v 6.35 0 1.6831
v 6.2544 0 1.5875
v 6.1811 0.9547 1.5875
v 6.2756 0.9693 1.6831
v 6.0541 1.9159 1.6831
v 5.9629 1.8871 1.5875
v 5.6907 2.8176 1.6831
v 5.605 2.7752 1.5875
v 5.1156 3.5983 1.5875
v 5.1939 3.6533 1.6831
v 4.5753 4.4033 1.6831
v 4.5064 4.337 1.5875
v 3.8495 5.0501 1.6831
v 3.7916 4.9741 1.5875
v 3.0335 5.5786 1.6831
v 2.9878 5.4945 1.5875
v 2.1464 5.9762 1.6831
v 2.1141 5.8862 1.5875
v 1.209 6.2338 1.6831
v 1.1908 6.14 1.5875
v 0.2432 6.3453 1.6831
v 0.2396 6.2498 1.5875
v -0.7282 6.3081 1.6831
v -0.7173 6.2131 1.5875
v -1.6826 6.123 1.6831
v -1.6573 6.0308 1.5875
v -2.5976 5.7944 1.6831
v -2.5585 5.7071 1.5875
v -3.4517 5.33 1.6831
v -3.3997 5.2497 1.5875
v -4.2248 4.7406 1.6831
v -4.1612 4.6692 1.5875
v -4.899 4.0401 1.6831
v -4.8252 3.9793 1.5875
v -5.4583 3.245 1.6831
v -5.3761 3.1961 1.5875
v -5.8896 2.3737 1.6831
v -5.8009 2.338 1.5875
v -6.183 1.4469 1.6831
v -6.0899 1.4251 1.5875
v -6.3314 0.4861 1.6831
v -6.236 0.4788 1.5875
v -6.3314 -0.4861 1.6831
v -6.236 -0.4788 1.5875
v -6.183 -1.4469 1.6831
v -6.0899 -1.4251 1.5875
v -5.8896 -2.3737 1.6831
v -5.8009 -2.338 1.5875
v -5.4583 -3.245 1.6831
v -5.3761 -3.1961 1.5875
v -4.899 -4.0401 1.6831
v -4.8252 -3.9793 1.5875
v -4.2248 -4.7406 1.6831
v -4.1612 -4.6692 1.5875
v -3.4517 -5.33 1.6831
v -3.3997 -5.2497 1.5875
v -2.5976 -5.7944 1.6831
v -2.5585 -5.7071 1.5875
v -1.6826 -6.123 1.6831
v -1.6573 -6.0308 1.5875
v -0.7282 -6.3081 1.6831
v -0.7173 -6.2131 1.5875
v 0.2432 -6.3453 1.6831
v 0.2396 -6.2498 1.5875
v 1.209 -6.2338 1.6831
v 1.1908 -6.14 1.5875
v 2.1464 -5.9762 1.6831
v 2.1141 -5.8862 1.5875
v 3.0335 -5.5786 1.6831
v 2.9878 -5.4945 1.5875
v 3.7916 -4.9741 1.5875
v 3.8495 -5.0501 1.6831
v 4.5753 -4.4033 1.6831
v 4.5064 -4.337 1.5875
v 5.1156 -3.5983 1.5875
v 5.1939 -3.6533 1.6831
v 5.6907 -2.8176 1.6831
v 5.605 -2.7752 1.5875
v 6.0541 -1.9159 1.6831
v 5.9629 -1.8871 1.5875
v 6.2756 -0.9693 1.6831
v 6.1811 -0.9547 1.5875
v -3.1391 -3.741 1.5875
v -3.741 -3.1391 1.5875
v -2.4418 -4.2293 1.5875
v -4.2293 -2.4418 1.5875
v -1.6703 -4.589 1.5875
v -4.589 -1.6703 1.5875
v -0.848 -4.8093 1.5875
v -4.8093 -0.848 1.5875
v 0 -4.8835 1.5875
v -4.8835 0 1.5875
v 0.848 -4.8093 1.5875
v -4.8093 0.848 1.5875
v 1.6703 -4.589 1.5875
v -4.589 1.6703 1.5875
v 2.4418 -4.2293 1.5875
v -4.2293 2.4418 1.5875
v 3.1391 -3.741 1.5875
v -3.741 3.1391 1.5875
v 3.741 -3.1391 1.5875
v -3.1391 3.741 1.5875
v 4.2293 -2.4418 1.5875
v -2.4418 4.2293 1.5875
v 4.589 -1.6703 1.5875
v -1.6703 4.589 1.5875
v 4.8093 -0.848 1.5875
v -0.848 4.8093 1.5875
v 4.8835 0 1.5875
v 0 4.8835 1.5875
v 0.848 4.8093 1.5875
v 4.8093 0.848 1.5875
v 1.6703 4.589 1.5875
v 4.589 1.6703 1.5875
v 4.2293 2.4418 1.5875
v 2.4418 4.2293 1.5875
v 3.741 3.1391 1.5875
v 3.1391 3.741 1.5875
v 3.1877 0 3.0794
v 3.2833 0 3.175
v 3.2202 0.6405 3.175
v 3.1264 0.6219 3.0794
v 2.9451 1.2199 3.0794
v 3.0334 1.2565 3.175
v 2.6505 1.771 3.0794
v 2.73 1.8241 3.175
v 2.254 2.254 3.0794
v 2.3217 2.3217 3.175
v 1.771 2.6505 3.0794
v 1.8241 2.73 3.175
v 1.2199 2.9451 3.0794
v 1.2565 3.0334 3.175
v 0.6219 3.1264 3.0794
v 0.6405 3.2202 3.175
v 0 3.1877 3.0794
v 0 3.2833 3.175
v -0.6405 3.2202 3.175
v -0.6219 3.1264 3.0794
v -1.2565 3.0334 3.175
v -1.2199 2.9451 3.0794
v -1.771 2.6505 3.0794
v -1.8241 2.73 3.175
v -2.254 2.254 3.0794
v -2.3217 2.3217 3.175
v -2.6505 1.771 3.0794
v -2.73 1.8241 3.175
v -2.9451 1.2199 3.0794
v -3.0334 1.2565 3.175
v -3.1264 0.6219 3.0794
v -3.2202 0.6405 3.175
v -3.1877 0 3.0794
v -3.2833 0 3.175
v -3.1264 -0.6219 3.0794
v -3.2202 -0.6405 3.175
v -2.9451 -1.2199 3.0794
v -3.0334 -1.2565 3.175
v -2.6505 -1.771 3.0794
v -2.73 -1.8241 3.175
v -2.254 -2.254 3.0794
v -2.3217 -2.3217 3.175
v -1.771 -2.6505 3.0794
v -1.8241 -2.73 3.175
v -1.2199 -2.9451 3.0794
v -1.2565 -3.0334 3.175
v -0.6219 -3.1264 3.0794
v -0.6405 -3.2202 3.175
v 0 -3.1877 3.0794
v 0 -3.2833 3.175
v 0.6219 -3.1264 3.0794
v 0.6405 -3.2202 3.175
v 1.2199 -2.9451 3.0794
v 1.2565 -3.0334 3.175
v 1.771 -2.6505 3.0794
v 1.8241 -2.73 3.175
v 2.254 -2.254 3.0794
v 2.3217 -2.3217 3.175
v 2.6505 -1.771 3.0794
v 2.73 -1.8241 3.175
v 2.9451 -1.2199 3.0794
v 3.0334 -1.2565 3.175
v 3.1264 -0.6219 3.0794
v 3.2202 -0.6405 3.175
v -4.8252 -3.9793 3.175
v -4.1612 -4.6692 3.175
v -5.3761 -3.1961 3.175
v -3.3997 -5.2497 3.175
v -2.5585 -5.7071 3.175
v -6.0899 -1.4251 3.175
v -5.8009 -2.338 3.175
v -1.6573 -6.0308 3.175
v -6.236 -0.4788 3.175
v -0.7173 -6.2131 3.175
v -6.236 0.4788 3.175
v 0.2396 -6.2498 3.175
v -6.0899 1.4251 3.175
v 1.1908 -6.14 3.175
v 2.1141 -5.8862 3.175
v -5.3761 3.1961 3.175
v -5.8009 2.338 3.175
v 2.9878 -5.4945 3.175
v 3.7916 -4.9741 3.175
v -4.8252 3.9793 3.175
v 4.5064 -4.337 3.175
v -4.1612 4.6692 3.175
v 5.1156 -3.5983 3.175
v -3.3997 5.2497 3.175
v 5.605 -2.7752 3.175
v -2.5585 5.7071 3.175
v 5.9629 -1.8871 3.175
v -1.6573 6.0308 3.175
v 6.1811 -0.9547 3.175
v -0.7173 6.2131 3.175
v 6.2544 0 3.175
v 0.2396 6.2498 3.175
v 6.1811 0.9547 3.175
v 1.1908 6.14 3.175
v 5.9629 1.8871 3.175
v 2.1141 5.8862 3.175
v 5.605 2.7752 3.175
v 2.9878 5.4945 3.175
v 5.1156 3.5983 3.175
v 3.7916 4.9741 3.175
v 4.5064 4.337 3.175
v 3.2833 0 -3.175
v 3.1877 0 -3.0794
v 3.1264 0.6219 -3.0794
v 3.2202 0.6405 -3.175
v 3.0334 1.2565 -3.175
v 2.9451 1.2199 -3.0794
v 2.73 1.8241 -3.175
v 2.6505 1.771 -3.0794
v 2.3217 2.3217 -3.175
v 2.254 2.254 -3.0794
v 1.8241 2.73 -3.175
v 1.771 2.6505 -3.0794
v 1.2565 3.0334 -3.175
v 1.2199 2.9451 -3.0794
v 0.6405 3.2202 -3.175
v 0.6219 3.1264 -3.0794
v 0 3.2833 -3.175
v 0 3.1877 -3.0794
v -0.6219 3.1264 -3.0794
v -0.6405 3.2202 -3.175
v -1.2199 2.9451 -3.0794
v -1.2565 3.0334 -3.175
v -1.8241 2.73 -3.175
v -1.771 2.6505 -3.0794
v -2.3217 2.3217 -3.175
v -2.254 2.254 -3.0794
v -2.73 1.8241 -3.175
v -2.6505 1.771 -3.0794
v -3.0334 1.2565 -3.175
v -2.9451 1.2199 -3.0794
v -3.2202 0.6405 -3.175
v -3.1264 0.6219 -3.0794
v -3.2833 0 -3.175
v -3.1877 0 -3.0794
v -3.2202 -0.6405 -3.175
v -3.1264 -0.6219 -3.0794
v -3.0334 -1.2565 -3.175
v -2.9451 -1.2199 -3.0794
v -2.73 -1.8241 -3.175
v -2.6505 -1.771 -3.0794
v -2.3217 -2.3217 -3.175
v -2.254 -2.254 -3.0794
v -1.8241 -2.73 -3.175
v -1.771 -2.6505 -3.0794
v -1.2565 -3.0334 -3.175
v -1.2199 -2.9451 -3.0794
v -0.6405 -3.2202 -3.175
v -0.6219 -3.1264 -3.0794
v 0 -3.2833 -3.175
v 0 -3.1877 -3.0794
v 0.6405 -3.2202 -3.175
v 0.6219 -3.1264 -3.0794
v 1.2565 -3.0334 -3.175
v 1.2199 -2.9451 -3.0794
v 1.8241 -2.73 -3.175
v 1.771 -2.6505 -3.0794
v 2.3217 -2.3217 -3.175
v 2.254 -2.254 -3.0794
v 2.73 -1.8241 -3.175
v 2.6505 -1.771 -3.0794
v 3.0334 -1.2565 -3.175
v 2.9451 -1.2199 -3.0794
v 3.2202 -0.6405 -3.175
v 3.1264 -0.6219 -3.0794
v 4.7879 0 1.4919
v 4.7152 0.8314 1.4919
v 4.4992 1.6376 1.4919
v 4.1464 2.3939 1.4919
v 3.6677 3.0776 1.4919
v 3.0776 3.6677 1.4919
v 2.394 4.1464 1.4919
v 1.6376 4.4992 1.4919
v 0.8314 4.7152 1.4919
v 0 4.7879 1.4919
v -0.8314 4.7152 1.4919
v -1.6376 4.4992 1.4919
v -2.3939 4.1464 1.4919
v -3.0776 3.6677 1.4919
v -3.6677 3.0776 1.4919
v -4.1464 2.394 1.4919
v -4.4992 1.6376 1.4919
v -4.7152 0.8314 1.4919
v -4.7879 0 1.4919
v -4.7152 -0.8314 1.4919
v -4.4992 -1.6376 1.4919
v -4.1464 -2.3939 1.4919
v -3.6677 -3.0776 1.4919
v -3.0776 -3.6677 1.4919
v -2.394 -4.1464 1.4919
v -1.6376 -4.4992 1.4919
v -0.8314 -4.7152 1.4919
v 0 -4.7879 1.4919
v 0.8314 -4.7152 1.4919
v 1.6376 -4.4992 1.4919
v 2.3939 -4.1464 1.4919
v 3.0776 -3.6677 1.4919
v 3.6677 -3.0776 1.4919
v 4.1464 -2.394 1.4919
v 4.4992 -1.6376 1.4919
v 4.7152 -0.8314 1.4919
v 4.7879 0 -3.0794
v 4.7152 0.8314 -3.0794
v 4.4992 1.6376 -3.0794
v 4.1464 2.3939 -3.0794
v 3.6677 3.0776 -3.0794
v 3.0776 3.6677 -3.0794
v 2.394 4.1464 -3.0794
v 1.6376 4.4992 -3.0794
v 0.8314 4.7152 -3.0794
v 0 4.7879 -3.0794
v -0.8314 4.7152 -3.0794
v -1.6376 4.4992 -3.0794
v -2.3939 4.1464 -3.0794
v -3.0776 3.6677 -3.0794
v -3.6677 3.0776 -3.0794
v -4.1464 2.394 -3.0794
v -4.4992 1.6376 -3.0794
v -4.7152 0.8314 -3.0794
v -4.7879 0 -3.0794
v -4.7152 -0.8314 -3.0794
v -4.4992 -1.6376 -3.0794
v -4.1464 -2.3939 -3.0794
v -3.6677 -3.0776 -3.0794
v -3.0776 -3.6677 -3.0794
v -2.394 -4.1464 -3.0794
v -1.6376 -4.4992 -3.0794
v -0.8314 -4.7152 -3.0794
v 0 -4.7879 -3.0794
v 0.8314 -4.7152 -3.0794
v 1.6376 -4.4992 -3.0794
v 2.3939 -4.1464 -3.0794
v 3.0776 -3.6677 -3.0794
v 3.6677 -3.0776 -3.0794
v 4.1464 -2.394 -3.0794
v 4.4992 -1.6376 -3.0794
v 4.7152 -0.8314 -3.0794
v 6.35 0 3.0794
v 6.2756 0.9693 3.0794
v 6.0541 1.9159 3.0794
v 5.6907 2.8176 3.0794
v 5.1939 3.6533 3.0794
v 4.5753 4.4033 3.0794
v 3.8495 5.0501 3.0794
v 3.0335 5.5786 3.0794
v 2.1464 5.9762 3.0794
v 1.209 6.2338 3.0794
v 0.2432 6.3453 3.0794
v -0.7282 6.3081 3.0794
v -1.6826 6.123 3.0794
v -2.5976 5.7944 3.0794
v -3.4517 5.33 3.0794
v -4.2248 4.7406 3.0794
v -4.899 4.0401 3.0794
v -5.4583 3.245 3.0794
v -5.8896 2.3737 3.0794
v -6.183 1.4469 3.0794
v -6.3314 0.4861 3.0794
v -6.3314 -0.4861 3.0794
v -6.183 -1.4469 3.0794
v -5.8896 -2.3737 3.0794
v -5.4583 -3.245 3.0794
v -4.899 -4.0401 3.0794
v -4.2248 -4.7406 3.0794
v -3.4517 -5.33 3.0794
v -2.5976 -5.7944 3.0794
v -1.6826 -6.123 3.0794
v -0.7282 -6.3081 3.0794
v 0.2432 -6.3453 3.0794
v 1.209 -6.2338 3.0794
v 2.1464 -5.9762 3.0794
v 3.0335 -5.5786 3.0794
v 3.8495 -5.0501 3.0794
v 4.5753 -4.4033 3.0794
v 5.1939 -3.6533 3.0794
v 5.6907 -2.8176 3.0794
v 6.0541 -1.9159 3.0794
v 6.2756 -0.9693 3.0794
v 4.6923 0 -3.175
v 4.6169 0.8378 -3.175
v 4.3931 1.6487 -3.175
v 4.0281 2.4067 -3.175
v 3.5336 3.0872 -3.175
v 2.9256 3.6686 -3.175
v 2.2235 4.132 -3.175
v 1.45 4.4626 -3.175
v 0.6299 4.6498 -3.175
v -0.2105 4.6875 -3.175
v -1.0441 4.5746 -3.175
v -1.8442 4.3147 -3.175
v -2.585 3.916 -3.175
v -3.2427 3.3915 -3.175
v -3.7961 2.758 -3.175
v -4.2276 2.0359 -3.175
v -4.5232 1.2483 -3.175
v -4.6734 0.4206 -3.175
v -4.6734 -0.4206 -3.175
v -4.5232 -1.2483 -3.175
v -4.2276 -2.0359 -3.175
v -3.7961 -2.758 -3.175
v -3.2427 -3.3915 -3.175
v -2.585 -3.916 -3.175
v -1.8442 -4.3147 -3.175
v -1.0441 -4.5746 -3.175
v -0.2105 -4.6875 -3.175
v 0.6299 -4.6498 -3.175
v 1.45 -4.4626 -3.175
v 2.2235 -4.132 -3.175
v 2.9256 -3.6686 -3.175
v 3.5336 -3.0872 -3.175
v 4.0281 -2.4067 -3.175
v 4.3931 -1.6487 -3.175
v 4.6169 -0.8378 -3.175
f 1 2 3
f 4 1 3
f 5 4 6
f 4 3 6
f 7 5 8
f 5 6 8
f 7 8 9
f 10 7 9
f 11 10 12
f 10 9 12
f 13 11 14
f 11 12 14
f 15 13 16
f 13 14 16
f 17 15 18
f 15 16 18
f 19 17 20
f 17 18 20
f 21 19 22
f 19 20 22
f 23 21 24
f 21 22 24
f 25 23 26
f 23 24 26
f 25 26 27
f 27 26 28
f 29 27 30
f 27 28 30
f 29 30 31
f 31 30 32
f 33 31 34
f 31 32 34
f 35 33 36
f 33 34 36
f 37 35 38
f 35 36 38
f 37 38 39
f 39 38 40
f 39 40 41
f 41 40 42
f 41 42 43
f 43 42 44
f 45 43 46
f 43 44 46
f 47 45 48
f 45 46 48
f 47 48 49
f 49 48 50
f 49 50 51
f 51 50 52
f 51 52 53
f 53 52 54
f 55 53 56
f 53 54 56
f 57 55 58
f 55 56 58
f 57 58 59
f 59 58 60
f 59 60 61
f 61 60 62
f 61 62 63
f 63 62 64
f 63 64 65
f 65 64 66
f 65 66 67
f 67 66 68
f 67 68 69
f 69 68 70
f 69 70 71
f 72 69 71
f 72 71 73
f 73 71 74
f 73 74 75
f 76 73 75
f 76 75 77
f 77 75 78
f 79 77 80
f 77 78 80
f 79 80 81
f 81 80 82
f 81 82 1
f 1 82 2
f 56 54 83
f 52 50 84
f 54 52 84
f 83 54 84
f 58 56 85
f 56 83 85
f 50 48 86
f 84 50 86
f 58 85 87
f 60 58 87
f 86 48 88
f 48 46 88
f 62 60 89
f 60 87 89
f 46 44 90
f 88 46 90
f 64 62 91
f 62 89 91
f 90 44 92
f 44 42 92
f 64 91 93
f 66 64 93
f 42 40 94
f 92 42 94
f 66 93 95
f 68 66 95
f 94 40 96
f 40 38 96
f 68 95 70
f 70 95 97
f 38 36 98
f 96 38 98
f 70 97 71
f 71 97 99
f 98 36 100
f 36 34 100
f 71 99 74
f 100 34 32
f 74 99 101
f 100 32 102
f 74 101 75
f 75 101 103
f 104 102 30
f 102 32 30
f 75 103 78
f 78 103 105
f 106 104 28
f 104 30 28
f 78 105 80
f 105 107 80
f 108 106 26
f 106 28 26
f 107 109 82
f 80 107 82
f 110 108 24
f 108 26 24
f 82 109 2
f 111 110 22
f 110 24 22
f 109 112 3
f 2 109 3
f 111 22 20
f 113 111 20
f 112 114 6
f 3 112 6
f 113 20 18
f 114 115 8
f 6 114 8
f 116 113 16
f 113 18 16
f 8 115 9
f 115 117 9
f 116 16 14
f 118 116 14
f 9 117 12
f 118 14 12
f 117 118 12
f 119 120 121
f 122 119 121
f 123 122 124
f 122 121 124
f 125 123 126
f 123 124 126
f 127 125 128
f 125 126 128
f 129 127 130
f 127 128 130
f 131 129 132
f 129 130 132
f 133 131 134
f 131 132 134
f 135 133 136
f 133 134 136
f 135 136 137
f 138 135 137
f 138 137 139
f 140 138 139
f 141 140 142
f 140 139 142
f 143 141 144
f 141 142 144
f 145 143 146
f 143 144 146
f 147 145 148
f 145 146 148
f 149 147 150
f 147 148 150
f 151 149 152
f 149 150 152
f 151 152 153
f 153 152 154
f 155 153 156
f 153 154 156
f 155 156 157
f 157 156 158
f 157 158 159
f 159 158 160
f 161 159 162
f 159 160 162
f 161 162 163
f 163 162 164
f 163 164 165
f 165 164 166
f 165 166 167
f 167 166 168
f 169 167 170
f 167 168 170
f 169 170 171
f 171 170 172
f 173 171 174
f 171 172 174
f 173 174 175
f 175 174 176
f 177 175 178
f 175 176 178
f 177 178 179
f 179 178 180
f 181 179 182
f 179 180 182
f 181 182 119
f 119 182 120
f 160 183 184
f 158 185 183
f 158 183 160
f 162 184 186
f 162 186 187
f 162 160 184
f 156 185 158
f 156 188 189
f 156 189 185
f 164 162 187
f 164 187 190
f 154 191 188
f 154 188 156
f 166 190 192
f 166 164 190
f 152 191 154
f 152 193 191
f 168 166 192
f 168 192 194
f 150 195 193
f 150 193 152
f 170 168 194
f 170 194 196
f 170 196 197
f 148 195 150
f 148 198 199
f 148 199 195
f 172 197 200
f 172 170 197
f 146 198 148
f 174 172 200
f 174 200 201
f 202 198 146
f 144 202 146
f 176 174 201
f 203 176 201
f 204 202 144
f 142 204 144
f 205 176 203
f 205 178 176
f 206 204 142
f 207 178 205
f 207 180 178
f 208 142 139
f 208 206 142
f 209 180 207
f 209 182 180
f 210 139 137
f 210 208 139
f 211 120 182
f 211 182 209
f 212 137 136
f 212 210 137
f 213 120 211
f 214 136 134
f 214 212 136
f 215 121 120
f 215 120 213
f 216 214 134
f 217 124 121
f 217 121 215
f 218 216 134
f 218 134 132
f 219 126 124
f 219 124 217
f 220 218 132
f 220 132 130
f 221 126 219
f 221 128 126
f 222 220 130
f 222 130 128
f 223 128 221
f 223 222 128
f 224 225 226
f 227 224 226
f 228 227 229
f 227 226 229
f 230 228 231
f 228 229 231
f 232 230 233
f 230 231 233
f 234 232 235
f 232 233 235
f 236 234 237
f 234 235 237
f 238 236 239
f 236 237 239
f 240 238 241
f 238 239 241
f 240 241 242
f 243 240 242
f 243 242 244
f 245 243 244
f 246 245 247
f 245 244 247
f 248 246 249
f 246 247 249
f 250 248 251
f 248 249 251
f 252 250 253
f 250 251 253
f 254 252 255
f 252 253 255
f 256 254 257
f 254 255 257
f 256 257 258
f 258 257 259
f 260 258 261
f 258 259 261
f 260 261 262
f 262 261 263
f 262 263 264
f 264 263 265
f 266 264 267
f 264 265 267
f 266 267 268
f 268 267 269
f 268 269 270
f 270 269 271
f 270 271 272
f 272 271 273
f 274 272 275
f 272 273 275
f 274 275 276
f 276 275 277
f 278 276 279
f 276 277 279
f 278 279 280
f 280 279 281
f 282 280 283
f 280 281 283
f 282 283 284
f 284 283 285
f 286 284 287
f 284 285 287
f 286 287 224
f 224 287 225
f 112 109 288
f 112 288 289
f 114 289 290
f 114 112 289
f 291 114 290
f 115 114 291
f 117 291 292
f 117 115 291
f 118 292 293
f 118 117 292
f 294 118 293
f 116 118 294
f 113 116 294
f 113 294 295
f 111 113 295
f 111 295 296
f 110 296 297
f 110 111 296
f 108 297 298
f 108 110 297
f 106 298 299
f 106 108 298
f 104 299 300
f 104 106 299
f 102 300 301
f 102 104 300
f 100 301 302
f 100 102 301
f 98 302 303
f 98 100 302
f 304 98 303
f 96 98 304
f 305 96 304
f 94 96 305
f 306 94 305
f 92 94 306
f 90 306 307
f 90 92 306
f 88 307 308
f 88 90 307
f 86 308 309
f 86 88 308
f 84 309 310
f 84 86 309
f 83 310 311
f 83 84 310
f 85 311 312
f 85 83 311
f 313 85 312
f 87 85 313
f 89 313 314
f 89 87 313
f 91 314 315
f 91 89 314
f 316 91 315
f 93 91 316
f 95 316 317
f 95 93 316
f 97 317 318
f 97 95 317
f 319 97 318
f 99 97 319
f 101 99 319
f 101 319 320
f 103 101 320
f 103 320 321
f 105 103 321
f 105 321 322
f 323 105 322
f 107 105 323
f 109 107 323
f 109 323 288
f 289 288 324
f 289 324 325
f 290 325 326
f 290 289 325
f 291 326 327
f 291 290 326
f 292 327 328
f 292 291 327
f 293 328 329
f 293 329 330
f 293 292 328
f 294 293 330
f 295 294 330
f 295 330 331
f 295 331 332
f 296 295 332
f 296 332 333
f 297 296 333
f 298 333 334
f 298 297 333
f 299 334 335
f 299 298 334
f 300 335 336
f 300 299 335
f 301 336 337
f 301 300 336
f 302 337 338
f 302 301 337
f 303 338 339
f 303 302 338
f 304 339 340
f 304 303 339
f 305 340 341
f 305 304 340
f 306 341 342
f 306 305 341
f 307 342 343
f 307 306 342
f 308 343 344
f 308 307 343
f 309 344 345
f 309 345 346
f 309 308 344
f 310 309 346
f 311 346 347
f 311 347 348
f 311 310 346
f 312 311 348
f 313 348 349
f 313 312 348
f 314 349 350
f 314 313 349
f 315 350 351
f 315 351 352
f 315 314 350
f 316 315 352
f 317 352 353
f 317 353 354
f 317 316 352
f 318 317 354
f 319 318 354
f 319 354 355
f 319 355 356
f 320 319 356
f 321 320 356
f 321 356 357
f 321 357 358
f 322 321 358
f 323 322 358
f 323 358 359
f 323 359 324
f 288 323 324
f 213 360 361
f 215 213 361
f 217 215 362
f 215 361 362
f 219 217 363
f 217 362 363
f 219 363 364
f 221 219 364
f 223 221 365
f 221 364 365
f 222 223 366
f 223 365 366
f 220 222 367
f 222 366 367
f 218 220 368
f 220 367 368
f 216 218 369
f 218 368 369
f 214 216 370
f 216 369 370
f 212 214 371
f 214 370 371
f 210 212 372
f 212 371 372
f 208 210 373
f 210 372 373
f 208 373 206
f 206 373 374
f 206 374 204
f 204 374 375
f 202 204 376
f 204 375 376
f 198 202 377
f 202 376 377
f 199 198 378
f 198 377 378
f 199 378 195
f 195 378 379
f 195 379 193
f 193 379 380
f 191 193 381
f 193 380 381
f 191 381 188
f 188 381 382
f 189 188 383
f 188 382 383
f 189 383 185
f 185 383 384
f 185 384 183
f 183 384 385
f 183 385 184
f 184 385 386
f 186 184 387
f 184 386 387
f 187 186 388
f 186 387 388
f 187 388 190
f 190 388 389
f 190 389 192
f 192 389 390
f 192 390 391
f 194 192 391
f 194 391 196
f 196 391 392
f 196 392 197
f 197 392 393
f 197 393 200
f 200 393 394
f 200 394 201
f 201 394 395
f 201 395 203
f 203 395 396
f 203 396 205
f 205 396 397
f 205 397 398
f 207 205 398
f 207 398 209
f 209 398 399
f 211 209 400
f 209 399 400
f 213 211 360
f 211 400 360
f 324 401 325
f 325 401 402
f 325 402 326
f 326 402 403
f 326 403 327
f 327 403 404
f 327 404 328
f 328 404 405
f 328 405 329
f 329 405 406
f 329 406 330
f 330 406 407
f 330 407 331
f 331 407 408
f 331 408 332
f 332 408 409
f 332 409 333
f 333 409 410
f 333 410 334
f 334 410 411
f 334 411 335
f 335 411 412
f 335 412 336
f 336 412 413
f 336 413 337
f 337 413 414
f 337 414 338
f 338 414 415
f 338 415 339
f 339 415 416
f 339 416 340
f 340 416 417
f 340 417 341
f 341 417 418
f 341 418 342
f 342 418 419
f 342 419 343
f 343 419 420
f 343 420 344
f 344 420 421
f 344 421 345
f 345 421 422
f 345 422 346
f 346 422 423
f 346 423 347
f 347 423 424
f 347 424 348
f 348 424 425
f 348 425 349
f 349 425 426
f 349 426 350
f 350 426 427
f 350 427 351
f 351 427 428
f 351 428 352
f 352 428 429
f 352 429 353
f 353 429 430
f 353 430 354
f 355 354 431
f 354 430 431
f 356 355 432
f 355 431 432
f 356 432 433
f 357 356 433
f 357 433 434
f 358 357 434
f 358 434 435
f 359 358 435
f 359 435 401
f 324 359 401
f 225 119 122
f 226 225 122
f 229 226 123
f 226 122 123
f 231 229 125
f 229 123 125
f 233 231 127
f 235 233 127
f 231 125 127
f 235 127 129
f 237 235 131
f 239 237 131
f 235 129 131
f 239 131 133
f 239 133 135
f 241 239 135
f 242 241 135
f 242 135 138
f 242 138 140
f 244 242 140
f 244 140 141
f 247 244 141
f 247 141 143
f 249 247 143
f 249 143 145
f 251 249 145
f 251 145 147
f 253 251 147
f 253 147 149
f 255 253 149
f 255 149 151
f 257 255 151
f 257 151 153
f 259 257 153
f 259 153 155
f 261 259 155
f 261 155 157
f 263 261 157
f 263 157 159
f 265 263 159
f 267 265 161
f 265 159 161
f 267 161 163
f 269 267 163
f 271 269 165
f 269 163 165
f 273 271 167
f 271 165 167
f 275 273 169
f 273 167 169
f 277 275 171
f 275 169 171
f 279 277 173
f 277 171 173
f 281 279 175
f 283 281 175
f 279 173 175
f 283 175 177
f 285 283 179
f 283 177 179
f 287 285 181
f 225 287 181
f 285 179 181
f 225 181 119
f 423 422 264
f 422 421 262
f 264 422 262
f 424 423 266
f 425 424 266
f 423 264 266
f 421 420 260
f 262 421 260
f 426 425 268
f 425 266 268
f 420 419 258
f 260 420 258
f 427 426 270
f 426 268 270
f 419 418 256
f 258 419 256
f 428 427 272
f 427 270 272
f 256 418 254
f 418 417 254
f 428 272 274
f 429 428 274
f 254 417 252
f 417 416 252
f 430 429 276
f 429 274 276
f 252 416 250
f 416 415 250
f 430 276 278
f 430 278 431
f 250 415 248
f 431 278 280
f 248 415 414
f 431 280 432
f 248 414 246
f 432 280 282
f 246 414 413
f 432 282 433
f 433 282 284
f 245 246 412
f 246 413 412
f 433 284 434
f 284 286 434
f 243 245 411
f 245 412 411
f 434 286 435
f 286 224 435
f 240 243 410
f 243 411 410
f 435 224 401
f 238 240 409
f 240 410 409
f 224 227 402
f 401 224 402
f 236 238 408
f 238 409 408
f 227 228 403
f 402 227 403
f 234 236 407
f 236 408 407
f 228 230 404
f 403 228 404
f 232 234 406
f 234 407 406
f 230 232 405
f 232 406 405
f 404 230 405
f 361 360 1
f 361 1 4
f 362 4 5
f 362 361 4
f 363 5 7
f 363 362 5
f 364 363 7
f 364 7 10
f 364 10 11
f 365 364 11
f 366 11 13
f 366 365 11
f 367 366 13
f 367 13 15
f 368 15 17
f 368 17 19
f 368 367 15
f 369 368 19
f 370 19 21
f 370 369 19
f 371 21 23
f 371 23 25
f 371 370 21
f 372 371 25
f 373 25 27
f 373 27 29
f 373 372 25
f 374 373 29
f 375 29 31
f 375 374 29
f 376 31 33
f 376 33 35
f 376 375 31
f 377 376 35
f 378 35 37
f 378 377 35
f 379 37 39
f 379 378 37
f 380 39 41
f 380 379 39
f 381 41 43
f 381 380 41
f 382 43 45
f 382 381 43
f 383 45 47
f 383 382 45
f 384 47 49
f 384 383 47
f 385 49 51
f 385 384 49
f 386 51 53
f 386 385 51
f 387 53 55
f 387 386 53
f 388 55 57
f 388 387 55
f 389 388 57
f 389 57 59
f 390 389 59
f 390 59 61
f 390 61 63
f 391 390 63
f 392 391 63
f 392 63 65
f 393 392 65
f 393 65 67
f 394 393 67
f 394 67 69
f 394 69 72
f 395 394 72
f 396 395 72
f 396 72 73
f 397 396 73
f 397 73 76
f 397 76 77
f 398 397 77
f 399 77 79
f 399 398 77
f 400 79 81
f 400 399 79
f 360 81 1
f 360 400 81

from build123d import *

# Parameters (mm, degrees)
BOSS_EXTRUDE1_START = 3.175
SKETCH3_R           = 6.35
SKETCH3_R_2         = 3.1877
BOSS_EXTRUDE1_DEPTH = 1.5875
BOSS_EXTRUDE2_START = 1.5875
SKETCH4_R           = 4.7879
SKETCH4_R_2         = 3.1877
BOSS_EXTRUDE2_DEPTH = 4.7625
CHAMFER1_SIZE       = 0.095631


with BuildPart() as part:
    # Sketch3 → Boss-Extrude1 (new body)
    with BuildSketch(Plane.XY.offset(BOSS_EXTRUDE1_START)):
        Circle(SKETCH3_R)
        Circle(SKETCH3_R_2, mode=Mode.SUBTRACT)
    extrude(amount=-BOSS_EXTRUDE1_DEPTH)

    # Sketch4 → Boss-Extrude2 (add)
    with BuildSketch(Plane.XY.offset(BOSS_EXTRUDE2_START)):
        Circle(SKETCH4_R)
        Circle(SKETCH4_R_2, mode=Mode.SUBTRACT)
    extrude(amount=-BOSS_EXTRUDE2_DEPTH)

    # Chamfer1
    chamfer1_edges = [part.edges().sort_by_distance(p)[0] for p in [
        (-3.1877, 0, -3.175),
        (-4.7879, 0, 1.5875),
        (-6.35, 0, 3.175),
        (-6.35, 0, 1.5875),
        (-3.1877, 0, 3.175),
        (-4.7879, 0, -3.175),
    ]]
    chamfer(chamfer1_edges, length=CHAMFER1_SIZE)


solid = part.part
